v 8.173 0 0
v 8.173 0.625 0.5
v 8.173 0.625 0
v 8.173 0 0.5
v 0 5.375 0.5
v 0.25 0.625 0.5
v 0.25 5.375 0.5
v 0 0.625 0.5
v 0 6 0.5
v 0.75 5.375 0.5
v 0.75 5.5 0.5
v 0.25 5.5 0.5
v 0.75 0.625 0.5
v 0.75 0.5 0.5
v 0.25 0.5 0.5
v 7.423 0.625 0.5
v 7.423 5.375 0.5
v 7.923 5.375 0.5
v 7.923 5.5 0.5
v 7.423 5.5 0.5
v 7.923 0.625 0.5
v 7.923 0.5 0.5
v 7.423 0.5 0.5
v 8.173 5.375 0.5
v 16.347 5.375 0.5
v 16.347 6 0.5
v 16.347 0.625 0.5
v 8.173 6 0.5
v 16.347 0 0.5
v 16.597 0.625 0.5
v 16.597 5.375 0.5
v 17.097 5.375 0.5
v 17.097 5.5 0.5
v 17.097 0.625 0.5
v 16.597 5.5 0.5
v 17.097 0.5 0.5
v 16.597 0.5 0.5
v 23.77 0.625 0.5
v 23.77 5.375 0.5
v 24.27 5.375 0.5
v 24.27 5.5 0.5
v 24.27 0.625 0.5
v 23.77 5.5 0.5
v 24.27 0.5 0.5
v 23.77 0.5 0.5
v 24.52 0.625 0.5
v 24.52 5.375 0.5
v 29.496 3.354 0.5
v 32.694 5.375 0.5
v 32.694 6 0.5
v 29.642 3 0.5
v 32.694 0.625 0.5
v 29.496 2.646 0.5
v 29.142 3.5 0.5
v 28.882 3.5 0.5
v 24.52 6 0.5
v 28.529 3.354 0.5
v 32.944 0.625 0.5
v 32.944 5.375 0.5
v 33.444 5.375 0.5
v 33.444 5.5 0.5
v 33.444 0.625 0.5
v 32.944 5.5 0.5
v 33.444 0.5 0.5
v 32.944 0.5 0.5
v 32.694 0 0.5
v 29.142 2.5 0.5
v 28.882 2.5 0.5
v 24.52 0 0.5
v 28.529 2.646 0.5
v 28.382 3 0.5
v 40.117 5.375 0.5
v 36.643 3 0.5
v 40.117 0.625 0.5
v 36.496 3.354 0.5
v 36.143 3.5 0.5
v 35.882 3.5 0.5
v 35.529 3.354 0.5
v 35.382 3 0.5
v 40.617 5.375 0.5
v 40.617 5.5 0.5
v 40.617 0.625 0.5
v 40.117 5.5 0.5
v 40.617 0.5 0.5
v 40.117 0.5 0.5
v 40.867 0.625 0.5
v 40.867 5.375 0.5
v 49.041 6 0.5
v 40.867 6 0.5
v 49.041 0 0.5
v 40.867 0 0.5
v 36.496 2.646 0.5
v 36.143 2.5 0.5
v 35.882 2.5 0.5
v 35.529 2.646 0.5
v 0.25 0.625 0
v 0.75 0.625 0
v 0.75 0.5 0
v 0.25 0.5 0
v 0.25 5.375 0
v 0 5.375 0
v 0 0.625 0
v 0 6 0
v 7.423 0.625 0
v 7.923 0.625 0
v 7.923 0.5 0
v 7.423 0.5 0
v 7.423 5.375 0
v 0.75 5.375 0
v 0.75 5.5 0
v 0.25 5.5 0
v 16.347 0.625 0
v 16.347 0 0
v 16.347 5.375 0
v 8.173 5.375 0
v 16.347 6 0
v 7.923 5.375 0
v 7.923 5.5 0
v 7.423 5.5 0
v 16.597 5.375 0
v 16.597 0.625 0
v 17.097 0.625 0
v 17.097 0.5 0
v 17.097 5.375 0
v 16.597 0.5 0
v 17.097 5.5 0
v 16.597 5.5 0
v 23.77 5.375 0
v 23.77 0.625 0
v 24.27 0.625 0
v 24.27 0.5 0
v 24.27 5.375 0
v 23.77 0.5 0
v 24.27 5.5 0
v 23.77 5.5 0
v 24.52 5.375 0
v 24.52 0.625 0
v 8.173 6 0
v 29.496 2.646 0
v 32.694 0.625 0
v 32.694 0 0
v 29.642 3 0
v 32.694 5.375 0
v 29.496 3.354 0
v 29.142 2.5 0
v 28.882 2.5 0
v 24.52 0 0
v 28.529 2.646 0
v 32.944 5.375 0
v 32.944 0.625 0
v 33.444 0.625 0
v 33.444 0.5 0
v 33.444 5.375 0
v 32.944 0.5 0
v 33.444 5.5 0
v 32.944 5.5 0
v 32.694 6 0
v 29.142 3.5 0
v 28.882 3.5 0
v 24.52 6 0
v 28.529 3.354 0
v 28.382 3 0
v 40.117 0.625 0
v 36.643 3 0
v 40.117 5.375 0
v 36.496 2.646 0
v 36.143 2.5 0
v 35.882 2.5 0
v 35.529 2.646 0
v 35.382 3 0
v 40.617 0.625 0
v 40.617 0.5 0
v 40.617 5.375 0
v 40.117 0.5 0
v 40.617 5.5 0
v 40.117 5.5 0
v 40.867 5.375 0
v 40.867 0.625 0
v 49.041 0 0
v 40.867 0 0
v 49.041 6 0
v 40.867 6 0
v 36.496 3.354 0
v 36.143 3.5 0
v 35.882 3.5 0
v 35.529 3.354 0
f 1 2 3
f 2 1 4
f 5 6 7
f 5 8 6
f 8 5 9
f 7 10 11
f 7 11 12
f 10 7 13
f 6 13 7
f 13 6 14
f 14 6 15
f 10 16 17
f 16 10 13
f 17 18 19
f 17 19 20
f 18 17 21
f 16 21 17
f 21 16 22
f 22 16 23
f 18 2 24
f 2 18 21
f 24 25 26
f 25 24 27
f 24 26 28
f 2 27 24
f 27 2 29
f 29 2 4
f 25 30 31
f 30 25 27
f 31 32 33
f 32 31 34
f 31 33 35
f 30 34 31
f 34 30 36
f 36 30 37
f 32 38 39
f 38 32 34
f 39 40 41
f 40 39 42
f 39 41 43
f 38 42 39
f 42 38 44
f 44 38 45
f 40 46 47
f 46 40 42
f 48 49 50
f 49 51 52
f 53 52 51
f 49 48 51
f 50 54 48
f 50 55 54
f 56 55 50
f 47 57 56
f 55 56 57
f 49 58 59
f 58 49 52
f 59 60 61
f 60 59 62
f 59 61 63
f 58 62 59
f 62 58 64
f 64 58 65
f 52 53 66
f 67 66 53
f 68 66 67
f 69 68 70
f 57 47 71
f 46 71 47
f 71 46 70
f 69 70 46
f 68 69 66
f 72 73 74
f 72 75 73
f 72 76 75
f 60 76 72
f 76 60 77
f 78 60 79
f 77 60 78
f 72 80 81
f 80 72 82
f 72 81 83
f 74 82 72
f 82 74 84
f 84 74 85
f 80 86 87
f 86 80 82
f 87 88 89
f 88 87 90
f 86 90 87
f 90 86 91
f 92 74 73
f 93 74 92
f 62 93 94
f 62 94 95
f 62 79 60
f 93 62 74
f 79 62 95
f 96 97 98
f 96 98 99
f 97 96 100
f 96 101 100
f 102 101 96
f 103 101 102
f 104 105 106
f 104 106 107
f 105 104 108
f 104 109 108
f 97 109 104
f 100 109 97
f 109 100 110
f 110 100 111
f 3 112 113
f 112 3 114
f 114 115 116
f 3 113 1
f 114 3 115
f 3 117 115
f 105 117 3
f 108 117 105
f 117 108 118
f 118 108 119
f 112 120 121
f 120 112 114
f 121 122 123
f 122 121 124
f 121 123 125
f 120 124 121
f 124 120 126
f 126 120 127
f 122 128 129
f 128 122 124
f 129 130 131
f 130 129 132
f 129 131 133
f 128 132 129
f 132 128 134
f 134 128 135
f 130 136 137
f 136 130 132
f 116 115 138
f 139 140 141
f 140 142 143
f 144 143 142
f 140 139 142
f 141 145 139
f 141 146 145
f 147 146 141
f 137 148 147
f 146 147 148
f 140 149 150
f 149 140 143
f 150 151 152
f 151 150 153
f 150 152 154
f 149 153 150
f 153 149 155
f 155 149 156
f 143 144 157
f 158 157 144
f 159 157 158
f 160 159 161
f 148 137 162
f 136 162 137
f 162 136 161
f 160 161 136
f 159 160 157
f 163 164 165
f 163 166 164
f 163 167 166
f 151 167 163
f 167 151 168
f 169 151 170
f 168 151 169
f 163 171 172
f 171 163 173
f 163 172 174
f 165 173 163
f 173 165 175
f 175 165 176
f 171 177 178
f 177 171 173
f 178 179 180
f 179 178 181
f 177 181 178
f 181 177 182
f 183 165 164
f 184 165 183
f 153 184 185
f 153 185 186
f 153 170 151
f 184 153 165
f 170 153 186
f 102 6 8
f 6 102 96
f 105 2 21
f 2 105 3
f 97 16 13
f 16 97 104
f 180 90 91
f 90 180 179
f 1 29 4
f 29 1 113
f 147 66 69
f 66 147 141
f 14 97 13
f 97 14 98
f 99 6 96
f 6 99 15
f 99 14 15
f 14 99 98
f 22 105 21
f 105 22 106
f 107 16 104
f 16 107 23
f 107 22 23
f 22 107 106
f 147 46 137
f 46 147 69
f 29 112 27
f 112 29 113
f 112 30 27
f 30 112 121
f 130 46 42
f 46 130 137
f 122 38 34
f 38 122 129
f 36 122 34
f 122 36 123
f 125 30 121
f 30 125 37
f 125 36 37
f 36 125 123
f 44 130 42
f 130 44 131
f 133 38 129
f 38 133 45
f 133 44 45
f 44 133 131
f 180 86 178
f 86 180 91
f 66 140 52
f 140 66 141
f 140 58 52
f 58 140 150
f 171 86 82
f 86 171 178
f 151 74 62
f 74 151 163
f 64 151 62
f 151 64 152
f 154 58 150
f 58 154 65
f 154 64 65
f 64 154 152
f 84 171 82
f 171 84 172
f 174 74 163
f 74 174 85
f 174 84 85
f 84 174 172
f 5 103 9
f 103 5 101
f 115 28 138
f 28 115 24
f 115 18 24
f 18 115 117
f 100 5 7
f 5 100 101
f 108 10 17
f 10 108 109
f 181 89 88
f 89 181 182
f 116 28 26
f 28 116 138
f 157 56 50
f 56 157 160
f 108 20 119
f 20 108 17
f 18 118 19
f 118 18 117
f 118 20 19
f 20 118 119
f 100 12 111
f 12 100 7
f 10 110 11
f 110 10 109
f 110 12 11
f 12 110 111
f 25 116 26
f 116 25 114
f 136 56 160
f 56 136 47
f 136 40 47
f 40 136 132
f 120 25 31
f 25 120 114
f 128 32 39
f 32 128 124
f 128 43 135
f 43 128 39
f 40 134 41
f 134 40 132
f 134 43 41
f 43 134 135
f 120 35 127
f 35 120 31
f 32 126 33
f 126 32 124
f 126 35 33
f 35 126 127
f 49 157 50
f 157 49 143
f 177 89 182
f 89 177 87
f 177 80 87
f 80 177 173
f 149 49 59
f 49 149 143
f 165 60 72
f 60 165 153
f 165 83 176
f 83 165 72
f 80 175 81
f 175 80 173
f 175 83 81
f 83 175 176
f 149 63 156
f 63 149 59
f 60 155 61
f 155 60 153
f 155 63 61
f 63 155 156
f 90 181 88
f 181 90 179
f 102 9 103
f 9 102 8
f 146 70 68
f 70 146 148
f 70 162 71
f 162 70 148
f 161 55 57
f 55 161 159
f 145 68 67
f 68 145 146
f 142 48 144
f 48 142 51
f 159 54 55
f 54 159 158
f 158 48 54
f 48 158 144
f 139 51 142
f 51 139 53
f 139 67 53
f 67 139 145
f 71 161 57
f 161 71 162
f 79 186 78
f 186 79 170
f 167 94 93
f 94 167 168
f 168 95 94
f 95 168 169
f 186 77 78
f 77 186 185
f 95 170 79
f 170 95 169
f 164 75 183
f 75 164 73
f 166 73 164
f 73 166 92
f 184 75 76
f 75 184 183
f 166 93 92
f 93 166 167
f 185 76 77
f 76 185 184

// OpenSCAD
// file: modus.scad
//Corner Joint - allows the sides of two parts to create inlayed corner. Aids with welding.
//need to verify module math is the same throughout all parts.

module cornerjoint(Z,L,H,EndGap,PadL,PadH,CJangle,CJcenter){
    //change so that H = Z of inlayed part (usually 0.5)
    //add center and angle in degrees option, orgin far side of cut out area

     if((CJangle==0)&&(CJcenter==0))
      {    
        translate([0,0,0])
        rotate([0,0,CJangle])
        difference(){
        cube([L,H+PadH,Z]);
        translate([EndGap,H,0])
        cube([PadL,PadH,Z]);
        translate([L-EndGap-PadL,H,0])
        cube([PadL,PadH,Z]);}
      }    
else if((CJangle==90)&&(CJcenter==0))
      {    
        translate([H+PadH,0,0])
        rotate([0,0,CJangle])
        difference(){
        cube([L,H+PadH,Z]);
        translate([EndGap,H,0])
        cube([PadL,PadH,Z]);
        translate([L-EndGap-PadL,H,0])
        cube([PadL,PadH,Z]);}
      }
else if((CJangle==180)&&(CJcenter==0))       
      {    
        translate([L,H+PadH,0])
        rotate([0,0,CJangle])
        difference(){
        cube([L,H+PadH,Z]);
        translate([EndGap,H,0])
        cube([PadL,PadH,Z]);
        translate([L-EndGap-PadL,H,0])
        cube([PadL,PadH,Z]);}
      }
else if((CJangle==270)&&(CJcenter==0))
      {    
        translate([0,L,0])
        rotate([0,0,CJangle])
        difference(){
        cube([L,H+PadH,Z]);
        translate([EndGap,H,0])
        cube([PadL,PadH,Z]);
        translate([L-EndGap-PadL,H,0])
        cube([PadL,PadH,Z]);}
      }  
      
//centered     
   
else if((CJangle==0)&&(CJcenter==1))
      {    
        translate([-L/2,0,0])
        rotate([0,0,CJangle])
        difference(){
        cube([L,H+PadH,Z]);
        translate([EndGap,H,0])
        cube([PadL,PadH,Z]);
        translate([L-EndGap-PadL,H,0])
        cube([PadL,PadH,Z]);}
      }  
else if((CJangle==90)&&(CJcenter==1))
      {    
        translate([0,-L/2,0])
        rotate([0,0,CJangle])
        difference(){
        cube([L,H+PadH,Z]);
        translate([EndGap,H,0])
        cube([PadL,PadH,Z]);
        translate([L-EndGap-PadL,H,0])
        cube([PadL,PadH,Z]);}
      }
else if((CJangle==180)&&(CJcenter==1))       
      {    
        translate([L/2,0,0])
        rotate([0,0,CJangle])
        difference(){
        cube([L,H+PadH,Z]);
        translate([EndGap,H,0])
        cube([PadL,PadH,Z]);
        translate([L-EndGap-PadL,H,0])
        cube([PadL,PadH,Z]);}
      }
else if((CJangle==270)&&(CJcenter==1))
      {    
        translate([0,L/2,0])
        rotate([0,0,CJangle])
        difference(){
        cube([L,H+PadH,Z]);
        translate([EndGap,H,0])
        cube([PadL,PadH,Z]);
        translate([L-EndGap-PadL,H,0])
        cube([PadL,PadH,Z]);}
      }
} //end cornerjoint module

//Tab Insert - used to cut a hole for an abutting part to insert into. Typically aids with welding the two parts.
module tabinsert(X,Y,Z,dGap,cGap,c1,c2,c3,c4,c5,c6,c7,c8,center){
    translate([-dGap-(center*(X/2)),-dGap-(center*(Y/2)),0]){
        //main cut
        cube([X+(dGap*2),Y+(dGap*2),Z]);
        //corner c1c2
        translate([-cGap,(Y+(dGap*2))-c1+cGap,0])
            {
        cube([c2,c1,Z]);}
       //corner c3c4
       translate([(X+(dGap*2))-c3+cGap,(Y+(dGap*2))-c4+cGap,0]){
           cube([c3,c4,Z]);
       }
       //corner c5c6
       translate([(X+(dGap*2))-c6+cGap,-cGap,0])
      {
          cube([c6,c5,Z]);
      }
       
       //corner c7c8 
       translate([-cGap,-cGap,0]){
           cube([c7,c8,Z]);
       }
    
    } //end center translate
} //end tabinsert module
 

module nut(flattoflat,nutheight){  //distance from one flat side to the other flat side "A/F"

//typical sizes found here:
//https://en.wikipedia.org/wiki/Nut_(hardware)

difference(){
    translate([0,0,nutheight/2])
cube(size = [10,10,nutheight], center = true);
    
for(i=[1:6]){
    rotate([0,0,i*60])
difference(){
    translate([-10,0,0])
    cube([20,20,nutheight]);
    translate([-10,0,0])
    cube([20,flattoflat/2,nutheight]);
}  //end difference
}  //end for
}  //end differeence
}  //end module
// file: vars.scad
brickW=6; 
brickL=24;
brickCH=6; //Is brick height being shortened by d1z??

//3.625 x 2.25 x 8
//6 x 12 x 6

grateX=56;
grateY=23;
grateH=37; //Height mounted above press's frame
grateA=17.5; //angle of grate

//grateX=56;
//grateY=23;
//grateH=37; //Height mounted above press's frame
//grateA=17.5; //angle of grate


$fn=8; //defines resolution of circles. 8 is okay for review. 100  or greater should be used for for final dxf export.

dZstandard=0.5; //thickness of steel to be cut for drawer parts
fZstandard=0.5;
aZstandard=0.5; //thickness of steel to be cut for arm parts
hZstandard=0.125;

fBOLTHOLEstandardD=1; //standard bolts used on frame
aBOLTHOLEstandardD=1;

sliderodholeOD=1.2; 
d1bushingOD=1.25;
d1bushingL=1.25;
d1shaftOD=1;
d1bolt1OD=1;
d1bolt2OD=0.75;
d1nut2AF=1.25;
d1nut2H=0.665;


dGap=0.03125; //gap between a hole cut's edge and the part sitting within the hole. //D3 appears to use 0.3125, is this in error?

//all parts set to standard thickness below
//off standard preferences can be defined below

//drawer
drawergap=0.0283;  //extra room for drawer to slide in the space between f1 and f4
drawerHgap=0.1884;  //total extra space from drawer sides to frame walls. sum of both sides.

d2clevispinaccessholeOD=3;

d1z=dZstandard;
d2z=dZstandard;
d3z=dZstandard;
d4z=dZstandard;
d5z=dZstandard;
d6z=dZstandard;
d5z=dZstandard;
d7z=dZstandard;
d8z=dZstandard;
d9z=dZstandard;

d11z=dZstandard;
d12z=dZstandard;


//frame

f1y=6;
f1z=fZstandard;


f2y=3.5;
f2z=fZstandard;

f3y=3.5;
f3z=fZstandard;

f4y=11;
f4z=fZstandard;

f5y=3.5;
f5z=fZstandard;

f6y=8;
f6z=fZstandard;

f8y=brickW;
f8z=fZstandard;
f8boltD=1;

f9y=4.5;

f9z=fZstandard;




f12z=fZstandard;   

f11x=1.25;
f11z=fZstandard;

f13z=fZstandard;

f14y=3.5;
f14z=fZstandard;

//arms

a1x=4;
a1z=aZstandard;
a1out=24; //length from frame to A5 edge for bricks to sit on as they exit

a2x=6;
a2z=aZstandard;

a3x=4;
a3y=72;
a3z=aZstandard;

a4x=6;
a4y=72;
a4z=aZstandard;

a5x=6;
a5y=72;
a5z=aZstandard;

a6z=aZstandard;

//guards

h1x=grateX;
h1y=grateH;  //might need to tweak for grate thickness

h1z=hZstandard;
h2z=hZstandard;
h3z=hZstandard;
h4z=hZstandard;
h5z=hZstandard;
h6z=hZstandard;
h7z=hZstandard;
h8z=hZstandard;

//
//Input your main cylinder's dimenions here
//
cylMainBore = 5;
cylMainStroke = 16;
cylMainExt = 43;
cylMainRet = 27;
cylMainA = (cylMainRet-cylMainStroke); //center to center minus stroke length
cylMainB = 0.25; // cylinder wall thickness
cylMainD = 2.5; //Rod OD
cylMainE = 5.75; //rear pin holder width
cylMainG = 4; //rod pin holder width
cylMainJ = 3.8; //distance from the end of the cylinder body to rod pin center
cylMainR = 1.52; //pin hole ID
cylMainS = 2.5; //pin holder OD

//
//Input your drawer cylinder's dimenions here
//
//
cylDrawerBore = 5;
cylDrawerStroke = 16;
cylDrawerExt = 43;
cylDrawerRet = 27;
cylDrawerA = (cylMainRet-cylMainStroke); //center to center minus stroke length
cylDrawerB = 0.25; // cylinder wall thickness
cylDrawerD = 2.5; //Rod OD
cylDrawerE = 5.75; //rear pin holder width
cylDrawerG = 4; //rod pin holder width
cylDrawerJ = 3.8; //distance from the end of the cylinder body to rod pin center
cylDrawerR = 1.52; //pin hole ID
cylDrawerS = 2.5; //pin holder OD

cylinderDRAWERbodyH=3; //measured when in position, largest length from top to bottom of cylinder
cylinderDRAWERminC2C=0; //drawer's hydraulic cylinder's distance from the center of one mounting hole to the center of the other when fully compressed.
cylinderDRAWERmaxC2C=0; ///drawer's hydraulic cylinder's distance from the center of one mounting hole to the center of the other when fully extended.
cylinderDRAWERrodclevisW=2.5; //width of cylinders' clevis on end of rod
cylinderDRAWERrodclevisID=1;
cylinderDRAWERrodclevisOD=2;
cylinderDRAWERrearclevisW=2.5; //width of mounting clevis cylinder body
cylinderDRAWERrearclevisID=1;
cylinderDRAWERrearclevisOD=2;
cylinderDRAWERrearclevisClearance=3; //usable space around rear clevis pin (in diameter). be aware of hyraulic fittings.

//the following variables are calculated in order of dependence on preceding variables

d3x=brickL+(d2z*2);
d3y=brickCH-d1z;
d4x=brickW+d3z+d3z;
d4y=brickCH-d1z;
d5x=brickL+(d2z*2);
d5y=brickW;
d6x=brickL+(d2z*2);
d6y=brickCH;
d7x=cylinderDRAWERrearclevisClearance;
d7y=a4z+d8z+cylinderDRAWERbodyH;
d9x=cylinderDRAWERbodyH+d6z; //should be based on clevis size?
d9y=cylinderDRAWERbodyH+d8z;
d8x=brickL+(d2z*2);
d8y=max(5,(d9x-d6z));   //need to review fundamentals, 5 minimun unless d9 gets larger than d8
d11x=1.5+(d1bolt1OD*2)+d1bushingOD;
d11y=max((0.5+d1bushingL),4);

d12x=d8x;
d12y=d11y+1;

f1x=((brickL+(d2z*2)+drawerHgap+(f9y*2)));
f3x=f1x;

d1x=(brickL+d2z+d2z);
//d1x=(((f1x/2)-(((brickL+(d2z*2)+drawerHgap)/2)-fZstandard-(sliderodholeOD/2)))+(d11x/2))*2;
d1y=((brickW+d3z+d3z)*3)+1;

d2x=d8y+d6z+brickW+d3z+d5y+d3z;
d2y=brickCH;



f11y=f8y;
f6x=brickL+(d2z*2)+(f9y*2)+drawerHgap;

f9x=(f2z+((cylMainS+0.125)/2)+cylMainRet-cylMainJ+1+f4y+drawergap+d2y+f1y);  //leaves 1" between top of cylinder and bottom of F4
f8x=f9x;


f2x=brickL+(d2z*2)+drawerHgap+(f9y*2)-(1.4*2);  //distance between large cut outs in f9

f5x=brickL+(d2z*2)+drawerHgap+(f9y*2)+(a1x*2); //distance between outer edges of each A1

f4x=f5x-0.5;   //same as f5 but minus 0.25 on each side to give a little overhang

f14x=brickL+(1*2)+(.125*2)+(dGap*2); 

f12x=f3x;
f12y=(f3y*2)+brickW;

sliderodoffset=(((brickL+(d2z*2)+drawerHgap)/2)-fZstandard-(sliderodholeOD/2));

distancetof8center=(cylDrawerExt+(a4x/2)+((d9x-d6z)/2)+d6z+(brickW/2)); //F8 center on A1

a1y=distancetof8center+(brickW/2)+a1out;
a2y=a1y;

h7x=f5x-((a1x/2)*2)+(1.5*2);
h7y=cylDrawerStroke;

h8x=f5x-((a1x/2)*2)+(1.5*2);
h8y=a1out-a5x-f5y;  //distance between a5 and f5

hopperBaseX=brickL;
hopperBaseY=brickW;

h2x=grateX;
h2y=sqrt(((h1y-(sin(grateA)*grateY))*(h1y-(sin(grateA)*grateY)))+(((cos(grateA)*grateY)-hopperBaseY)*((cos(grateA)*grateY)-hopperBaseY)));

//h1y-(sin(grateA)*grateY)
//(cos(grateA)*grateY)-hopperBaseY

echo(h1y-(sin(grateA)*grateY));
echo((cos(grateA)*grateY)-hopperBaseY);
echo(h2y);
echo(atan((h1y-(sin(grateA)*grateY))/((cos(grateA)*grateY)-hopperBaseY)));
echo((h1y-(sin(grateA)*grateY))/(h1y));

// ECHO - REQUIRED PARTS BASED ON INPUTS

echo(str("Minimum drawer cylinder stroke length: ",(d3z*2)+d5y+brickW));
//would be cool to validate and confirm user inputed stroke length. set error=1; if drawer cylinder is not long enough. print an echo warning.

echo(str("Grate hieght above ground level: ",(1)));
// main file
include <vars.scad>;
use <modus.scad>;

f8p();

module f8p(){

difference(){
cube([f8x,f8y,f8z]);
    translate([(1/12)*f8x,0,0])
        cornerjoint(f8z,(f8x/6),f9z,0.25,0.5,0.125,0,1);
    translate([(5/12)*f8x,0,0])
        cornerjoint(f8z,(f8x/6),f9z,0.25,0.5,0.125,0,1);
    translate([(9/12)*f8x,0,0])
        cornerjoint(f8z,(f8x/6),f9z,0.25,0.5,0.125,0,1);
    
    translate([(1/12)*f8x,f8y,0])
        cornerjoint(f8z,(f8x/6),f9z,0.25,0.5,0.125,180,1);
    translate([(5/12)*f8x,f8y,0])
        cornerjoint(f8z,(f8x/6),f9z,0.25,0.5,0.125,180,1);
    translate([(9/12)*f8x,f8y,0])
        cornerjoint(f8z,(f8x/6),f9z,0.25,0.5,0.125,180,1);
    
    hull(){
    translate([f8x-7-((f1y+d2y+drawergap+1)-(0.26/2)),f8y/2,0])  //?x interfaces with what? need to calculate center of F8
        cylinder(h = f8z, r = f8boltD/2);
    translate([f8x-7-((f1y+d2y+drawergap+1)+(0.26/2)),f8y/2,0])
        cylinder(h = f8z, r = f8boltD/2);
    }

        hull(){
    translate([f8x-((f1y+d2y+drawergap+1)-(0.26/2)),f8y/2,0])  //?x interfaces with what?
        cylinder(h = f8z, r = f8boltD/2);
    translate([f8x-((f1y+d2y+drawergap+1)+(0.26/2)),f8y/2,0])
        cylinder(h = f8z, r = f8boltD/2);
    }
}

} //end f8p module
